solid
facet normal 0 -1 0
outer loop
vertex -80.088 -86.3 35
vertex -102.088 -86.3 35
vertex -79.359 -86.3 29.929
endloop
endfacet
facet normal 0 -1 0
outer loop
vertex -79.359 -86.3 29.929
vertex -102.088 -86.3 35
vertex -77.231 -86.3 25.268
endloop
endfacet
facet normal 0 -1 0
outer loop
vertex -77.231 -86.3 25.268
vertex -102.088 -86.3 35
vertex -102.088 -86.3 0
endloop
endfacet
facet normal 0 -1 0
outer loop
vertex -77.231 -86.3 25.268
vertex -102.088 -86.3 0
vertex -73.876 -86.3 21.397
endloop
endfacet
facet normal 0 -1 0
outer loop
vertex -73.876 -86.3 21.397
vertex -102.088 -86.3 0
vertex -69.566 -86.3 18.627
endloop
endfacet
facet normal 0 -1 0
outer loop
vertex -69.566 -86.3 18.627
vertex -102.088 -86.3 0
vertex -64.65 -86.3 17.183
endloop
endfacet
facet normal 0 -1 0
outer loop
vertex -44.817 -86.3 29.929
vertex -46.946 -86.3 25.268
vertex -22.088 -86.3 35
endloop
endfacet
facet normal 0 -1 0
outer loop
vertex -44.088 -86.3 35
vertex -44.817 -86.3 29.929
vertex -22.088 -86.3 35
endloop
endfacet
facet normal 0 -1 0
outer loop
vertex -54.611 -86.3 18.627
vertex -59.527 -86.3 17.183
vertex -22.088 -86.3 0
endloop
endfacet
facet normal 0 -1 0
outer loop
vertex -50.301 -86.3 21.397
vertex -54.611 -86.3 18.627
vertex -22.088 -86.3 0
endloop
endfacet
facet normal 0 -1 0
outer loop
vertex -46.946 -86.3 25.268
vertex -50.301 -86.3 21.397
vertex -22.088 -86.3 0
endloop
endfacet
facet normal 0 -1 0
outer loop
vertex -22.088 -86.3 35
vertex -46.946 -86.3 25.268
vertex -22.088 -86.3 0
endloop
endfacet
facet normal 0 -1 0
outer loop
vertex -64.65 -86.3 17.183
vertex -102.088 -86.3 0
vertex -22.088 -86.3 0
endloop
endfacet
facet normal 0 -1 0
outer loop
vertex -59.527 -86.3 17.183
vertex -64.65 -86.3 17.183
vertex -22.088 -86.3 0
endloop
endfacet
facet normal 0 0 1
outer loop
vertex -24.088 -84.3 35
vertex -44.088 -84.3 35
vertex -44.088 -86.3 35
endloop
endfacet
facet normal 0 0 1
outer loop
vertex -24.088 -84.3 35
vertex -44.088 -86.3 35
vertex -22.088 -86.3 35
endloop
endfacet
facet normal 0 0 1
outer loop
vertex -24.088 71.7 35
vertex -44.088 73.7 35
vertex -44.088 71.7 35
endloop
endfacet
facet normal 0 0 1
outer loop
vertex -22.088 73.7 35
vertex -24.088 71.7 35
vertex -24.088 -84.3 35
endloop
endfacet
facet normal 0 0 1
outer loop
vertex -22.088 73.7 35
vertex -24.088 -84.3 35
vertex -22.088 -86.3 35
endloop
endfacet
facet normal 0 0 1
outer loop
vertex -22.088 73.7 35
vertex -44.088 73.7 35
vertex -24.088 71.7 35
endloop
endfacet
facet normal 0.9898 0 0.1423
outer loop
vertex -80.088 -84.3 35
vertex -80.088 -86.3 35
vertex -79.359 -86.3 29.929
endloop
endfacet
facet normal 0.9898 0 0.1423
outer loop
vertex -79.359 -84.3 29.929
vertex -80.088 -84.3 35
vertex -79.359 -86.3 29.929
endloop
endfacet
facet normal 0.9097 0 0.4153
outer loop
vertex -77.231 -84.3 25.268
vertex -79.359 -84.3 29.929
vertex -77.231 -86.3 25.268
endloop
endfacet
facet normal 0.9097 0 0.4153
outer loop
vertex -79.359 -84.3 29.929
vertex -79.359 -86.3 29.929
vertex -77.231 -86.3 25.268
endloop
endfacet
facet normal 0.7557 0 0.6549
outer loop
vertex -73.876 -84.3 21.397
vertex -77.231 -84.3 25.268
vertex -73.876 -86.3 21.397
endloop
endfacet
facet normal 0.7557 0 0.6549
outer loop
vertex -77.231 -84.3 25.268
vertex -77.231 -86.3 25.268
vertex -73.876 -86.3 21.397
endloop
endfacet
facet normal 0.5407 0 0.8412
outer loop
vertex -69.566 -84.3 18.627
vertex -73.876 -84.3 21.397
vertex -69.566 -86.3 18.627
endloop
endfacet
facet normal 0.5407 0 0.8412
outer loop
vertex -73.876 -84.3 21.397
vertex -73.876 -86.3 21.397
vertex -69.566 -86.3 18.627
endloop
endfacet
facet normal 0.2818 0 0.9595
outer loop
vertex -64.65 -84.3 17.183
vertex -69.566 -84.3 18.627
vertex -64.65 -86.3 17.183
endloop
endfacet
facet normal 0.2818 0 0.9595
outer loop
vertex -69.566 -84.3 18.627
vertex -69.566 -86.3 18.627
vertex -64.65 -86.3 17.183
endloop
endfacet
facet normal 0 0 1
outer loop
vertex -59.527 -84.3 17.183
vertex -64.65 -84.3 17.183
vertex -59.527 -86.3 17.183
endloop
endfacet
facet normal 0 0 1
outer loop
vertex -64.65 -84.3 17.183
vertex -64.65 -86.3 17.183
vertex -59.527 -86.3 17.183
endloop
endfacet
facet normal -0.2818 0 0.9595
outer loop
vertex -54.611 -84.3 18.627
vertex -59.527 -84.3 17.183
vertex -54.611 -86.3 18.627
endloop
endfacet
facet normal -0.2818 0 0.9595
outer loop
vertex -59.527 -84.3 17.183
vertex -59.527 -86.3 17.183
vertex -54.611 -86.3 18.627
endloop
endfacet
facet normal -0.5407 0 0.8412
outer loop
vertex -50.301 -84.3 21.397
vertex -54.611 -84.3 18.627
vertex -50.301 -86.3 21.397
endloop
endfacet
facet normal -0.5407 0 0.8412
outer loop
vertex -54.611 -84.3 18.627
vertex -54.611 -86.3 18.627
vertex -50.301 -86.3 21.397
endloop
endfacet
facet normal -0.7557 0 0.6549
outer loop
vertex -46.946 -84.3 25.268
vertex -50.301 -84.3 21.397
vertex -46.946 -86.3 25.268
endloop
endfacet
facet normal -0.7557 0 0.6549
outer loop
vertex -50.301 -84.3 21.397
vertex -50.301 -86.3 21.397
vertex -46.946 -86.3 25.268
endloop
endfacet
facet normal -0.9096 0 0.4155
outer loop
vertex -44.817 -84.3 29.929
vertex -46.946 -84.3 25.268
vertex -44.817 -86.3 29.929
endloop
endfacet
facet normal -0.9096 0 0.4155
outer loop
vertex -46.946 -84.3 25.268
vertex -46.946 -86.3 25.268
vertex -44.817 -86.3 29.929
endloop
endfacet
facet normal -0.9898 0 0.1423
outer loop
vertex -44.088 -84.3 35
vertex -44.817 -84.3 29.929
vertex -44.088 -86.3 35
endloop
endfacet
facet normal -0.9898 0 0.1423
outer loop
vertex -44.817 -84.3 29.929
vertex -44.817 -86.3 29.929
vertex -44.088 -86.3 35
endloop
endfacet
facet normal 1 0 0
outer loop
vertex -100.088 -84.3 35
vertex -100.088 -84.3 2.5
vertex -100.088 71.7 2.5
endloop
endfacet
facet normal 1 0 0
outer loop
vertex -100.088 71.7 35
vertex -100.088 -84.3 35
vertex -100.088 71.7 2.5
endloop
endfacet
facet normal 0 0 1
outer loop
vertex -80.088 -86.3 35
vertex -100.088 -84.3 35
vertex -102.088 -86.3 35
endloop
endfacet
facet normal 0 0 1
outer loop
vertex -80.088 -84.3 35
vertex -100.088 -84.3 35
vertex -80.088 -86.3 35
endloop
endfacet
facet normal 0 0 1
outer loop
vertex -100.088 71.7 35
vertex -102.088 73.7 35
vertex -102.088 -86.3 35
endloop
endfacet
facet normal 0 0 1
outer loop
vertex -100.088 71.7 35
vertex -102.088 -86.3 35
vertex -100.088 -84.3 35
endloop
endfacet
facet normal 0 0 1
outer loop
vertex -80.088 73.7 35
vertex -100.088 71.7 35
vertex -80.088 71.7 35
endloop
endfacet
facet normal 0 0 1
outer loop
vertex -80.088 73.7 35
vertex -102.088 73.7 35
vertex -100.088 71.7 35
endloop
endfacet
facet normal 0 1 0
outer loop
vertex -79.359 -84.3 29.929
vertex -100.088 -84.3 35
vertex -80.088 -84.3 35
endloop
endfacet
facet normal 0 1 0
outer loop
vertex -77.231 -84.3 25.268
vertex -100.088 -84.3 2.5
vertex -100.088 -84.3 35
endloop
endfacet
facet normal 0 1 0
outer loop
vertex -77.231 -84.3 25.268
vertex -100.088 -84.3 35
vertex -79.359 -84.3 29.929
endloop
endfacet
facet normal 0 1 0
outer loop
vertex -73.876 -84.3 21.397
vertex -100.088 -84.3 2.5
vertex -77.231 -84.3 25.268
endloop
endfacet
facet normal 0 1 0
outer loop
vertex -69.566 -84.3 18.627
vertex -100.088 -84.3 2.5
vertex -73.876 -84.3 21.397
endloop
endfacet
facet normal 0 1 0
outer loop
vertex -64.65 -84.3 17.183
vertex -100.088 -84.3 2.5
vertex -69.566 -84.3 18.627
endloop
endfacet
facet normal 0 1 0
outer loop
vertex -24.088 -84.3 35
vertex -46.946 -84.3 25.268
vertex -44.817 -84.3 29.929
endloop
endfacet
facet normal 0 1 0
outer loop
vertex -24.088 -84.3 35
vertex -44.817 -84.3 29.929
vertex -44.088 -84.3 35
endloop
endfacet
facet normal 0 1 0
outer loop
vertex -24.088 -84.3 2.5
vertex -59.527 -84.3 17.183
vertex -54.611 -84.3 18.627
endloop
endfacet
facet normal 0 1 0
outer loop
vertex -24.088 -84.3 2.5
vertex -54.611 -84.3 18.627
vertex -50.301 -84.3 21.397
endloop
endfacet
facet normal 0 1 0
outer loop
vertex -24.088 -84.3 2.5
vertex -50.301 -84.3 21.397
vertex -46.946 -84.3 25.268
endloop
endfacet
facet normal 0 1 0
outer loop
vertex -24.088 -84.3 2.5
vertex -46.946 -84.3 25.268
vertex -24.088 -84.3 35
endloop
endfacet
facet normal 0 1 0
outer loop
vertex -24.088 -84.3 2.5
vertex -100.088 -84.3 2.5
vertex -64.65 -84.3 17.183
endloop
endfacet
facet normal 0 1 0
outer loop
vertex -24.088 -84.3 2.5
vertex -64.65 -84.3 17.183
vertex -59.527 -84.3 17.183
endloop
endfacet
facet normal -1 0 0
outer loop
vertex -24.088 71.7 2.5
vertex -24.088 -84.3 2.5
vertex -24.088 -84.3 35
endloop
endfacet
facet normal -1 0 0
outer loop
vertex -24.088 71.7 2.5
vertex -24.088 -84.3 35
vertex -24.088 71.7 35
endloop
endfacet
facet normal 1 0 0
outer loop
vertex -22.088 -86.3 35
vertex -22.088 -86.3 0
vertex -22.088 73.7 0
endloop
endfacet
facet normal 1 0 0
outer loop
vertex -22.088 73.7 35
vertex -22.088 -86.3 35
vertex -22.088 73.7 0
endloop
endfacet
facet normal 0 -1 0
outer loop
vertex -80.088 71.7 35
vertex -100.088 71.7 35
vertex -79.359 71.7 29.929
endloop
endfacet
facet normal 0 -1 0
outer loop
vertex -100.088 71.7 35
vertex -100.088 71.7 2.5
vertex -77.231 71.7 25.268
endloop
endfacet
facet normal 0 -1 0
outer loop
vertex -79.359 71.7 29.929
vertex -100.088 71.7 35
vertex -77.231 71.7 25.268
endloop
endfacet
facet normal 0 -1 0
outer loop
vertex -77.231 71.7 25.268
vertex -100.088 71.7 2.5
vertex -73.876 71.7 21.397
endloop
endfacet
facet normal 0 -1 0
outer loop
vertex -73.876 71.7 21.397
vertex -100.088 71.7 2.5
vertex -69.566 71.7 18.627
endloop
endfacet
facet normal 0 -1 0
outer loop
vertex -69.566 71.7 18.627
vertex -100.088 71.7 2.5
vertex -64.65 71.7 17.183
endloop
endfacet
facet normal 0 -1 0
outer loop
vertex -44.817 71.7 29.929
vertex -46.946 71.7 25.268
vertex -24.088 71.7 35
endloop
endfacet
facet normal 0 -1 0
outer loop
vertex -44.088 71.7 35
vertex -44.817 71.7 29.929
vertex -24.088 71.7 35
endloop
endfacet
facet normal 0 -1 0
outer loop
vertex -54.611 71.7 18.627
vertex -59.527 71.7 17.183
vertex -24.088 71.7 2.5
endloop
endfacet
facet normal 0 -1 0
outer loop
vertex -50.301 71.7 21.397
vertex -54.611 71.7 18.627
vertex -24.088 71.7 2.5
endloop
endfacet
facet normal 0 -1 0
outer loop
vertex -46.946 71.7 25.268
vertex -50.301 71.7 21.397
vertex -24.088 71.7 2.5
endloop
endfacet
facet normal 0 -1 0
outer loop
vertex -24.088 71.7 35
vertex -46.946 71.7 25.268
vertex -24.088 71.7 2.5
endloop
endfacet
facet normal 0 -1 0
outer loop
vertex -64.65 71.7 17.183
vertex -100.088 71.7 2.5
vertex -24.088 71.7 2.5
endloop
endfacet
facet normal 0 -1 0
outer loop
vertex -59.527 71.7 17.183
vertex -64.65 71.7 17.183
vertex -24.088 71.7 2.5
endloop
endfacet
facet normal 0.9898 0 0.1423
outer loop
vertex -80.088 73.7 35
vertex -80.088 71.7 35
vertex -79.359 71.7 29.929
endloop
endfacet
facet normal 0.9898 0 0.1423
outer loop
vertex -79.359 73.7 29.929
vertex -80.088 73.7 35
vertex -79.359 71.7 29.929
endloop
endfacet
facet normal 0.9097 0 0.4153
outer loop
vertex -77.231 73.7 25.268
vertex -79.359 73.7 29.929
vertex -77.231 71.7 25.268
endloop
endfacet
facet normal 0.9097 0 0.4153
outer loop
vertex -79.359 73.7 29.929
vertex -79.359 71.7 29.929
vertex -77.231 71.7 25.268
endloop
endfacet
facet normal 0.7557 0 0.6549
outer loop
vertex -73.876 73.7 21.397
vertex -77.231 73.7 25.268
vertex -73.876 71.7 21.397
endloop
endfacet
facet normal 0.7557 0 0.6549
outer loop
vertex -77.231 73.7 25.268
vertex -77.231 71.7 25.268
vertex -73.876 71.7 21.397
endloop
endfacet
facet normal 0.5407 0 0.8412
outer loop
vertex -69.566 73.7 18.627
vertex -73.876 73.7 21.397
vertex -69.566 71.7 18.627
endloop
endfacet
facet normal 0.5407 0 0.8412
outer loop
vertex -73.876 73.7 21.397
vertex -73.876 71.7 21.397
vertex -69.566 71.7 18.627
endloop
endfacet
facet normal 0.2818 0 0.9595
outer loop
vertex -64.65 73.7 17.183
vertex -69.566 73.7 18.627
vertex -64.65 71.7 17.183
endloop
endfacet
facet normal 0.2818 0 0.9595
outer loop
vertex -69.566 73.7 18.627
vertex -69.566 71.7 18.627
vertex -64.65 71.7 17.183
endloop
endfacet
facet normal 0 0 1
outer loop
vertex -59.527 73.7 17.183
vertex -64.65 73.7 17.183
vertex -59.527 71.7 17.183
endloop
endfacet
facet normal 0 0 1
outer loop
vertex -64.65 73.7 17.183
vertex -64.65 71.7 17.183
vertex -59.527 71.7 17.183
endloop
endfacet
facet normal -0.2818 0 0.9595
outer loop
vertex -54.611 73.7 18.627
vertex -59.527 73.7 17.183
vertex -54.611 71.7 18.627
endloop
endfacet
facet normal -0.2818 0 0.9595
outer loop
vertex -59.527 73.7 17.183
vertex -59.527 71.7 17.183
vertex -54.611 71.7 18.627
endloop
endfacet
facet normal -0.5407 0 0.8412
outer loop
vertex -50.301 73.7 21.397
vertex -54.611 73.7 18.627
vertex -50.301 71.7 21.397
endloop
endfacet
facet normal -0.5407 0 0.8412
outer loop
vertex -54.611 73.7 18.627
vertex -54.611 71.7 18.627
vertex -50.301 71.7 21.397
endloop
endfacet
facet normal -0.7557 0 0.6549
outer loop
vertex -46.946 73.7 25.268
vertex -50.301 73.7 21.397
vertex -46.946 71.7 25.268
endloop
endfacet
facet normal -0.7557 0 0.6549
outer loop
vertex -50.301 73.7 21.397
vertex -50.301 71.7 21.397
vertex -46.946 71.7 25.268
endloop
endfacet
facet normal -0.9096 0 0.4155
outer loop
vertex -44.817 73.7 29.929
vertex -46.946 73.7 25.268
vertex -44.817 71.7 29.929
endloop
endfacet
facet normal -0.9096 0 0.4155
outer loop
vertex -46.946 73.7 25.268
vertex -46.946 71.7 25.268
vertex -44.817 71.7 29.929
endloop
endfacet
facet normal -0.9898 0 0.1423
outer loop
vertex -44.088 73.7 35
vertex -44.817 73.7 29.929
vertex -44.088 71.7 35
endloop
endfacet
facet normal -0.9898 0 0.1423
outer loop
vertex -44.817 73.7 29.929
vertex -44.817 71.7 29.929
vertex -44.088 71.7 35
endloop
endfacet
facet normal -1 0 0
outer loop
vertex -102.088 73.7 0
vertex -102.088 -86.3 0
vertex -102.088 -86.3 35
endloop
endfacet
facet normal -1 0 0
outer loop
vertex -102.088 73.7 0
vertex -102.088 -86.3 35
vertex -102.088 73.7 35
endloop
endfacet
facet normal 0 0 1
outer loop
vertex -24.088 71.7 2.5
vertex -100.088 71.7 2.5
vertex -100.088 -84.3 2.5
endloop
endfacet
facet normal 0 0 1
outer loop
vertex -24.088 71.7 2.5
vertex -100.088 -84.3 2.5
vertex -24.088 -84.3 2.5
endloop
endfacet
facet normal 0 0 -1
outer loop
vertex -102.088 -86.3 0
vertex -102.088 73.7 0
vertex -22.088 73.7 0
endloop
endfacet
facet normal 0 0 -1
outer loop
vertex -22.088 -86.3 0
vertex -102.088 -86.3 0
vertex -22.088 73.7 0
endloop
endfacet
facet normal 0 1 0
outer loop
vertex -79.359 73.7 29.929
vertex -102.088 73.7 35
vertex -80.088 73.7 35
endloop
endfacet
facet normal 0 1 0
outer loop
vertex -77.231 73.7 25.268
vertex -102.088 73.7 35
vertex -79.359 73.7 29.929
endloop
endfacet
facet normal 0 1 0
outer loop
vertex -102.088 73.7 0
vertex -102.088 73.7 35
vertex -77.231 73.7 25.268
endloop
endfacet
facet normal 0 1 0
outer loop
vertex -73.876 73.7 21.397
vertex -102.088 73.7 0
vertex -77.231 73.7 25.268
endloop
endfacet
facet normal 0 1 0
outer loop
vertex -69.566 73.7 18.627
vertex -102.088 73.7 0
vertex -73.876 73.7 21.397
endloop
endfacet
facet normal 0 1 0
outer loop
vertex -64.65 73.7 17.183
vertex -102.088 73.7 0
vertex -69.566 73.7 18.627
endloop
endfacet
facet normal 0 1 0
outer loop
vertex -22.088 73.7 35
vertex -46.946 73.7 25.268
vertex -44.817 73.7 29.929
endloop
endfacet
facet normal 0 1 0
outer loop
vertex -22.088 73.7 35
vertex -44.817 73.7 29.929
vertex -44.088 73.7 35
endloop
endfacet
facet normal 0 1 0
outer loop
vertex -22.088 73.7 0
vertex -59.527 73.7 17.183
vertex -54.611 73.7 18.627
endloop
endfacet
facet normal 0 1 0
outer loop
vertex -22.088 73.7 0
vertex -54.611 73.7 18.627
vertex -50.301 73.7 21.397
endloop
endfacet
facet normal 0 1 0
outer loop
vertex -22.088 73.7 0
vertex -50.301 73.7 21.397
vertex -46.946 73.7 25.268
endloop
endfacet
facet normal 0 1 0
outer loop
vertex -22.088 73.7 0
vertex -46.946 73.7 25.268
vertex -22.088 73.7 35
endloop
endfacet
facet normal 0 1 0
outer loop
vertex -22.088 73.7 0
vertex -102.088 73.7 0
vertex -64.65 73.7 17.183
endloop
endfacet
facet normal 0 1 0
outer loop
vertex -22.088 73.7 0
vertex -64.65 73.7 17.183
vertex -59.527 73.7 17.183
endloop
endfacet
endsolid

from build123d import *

# Parameters (mm, degrees)
F0_W     = 76
F0_H     = 156
F1_DEPTH = 2.5
F0_W_2   = 80
F0_H_2   = 160
F2_DEPTH = 35
F4_DEPTH = 160


with BuildPart() as f1:
    # F0 (on Top) → F1 (new body)
    with BuildSketch(Plane.XY):
        with Locations((-62.088289, -6.299588)):
            Rectangle(F0_W, F0_H)
    extrude(amount=F1_DEPTH)

    # F0 (on Top) → F2 (join)
    with BuildSketch(Plane.XY):
        with Locations((-62.088289, -6.299588)):
            Rectangle(F0_W_2, F0_H_2)
        with Locations((-62.088289, -6.299588)):
            Rectangle(F0_W, F0_H, mode=Mode.SUBTRACT)
    extrude(amount=F2_DEPTH)

    # F3 (on face) → F4 (cut)
    with BuildSketch(Plane.XZ.offset(86.299588)):
        with BuildLine():
            ThreePointArc((-80.088289, 35), (-62.088289, 17), (-44.088289, 35))
            Line((-44.088289, 35), (-80.088289, 35))
        make_face()
    extrude(amount=-F4_DEPTH, mode=Mode.SUBTRACT)


solid = f1.part
